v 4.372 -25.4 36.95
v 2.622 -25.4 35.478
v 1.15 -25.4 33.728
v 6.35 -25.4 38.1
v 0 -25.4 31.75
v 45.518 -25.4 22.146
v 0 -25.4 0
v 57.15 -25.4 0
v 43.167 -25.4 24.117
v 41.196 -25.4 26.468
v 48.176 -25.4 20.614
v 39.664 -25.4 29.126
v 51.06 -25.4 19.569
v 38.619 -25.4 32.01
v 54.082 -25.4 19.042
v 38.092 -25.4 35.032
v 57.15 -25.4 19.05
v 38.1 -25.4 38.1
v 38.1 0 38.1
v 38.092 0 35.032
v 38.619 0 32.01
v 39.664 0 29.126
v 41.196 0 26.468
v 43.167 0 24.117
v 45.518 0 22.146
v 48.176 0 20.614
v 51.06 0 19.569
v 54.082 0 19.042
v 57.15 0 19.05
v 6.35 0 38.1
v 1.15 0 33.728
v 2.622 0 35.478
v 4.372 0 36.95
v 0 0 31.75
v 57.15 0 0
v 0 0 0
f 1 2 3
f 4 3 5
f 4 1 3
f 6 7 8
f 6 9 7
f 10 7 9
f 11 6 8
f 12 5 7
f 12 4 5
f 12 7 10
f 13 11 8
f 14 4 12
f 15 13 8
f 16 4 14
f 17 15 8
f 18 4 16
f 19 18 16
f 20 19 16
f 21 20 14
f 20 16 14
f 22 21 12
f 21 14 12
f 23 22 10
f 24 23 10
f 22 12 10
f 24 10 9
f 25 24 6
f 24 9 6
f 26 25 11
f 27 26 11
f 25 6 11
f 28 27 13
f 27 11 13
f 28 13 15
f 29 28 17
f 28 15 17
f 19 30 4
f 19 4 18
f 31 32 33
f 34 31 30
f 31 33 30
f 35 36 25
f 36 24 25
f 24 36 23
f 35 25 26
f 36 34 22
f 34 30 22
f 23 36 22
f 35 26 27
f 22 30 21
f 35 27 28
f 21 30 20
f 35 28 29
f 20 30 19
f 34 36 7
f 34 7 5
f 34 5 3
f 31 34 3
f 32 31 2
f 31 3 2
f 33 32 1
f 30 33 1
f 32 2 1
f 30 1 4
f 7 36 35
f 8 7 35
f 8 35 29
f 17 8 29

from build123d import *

# Parameters (mm, degrees)
F0_W     = 57.15
F0_H     = 38.1
F1_DEPTH = 25.4
F3_DEPTH = 25.4
F5_DEPTH = 25.4


with BuildPart() as f1:
    # F0 (on Front) → F1 (new body)
    with BuildSketch(Plane.XZ):
        with Locations((28.575, 19.05)):
            Rectangle(F0_W, F0_H)
    extrude(amount=F1_DEPTH)

    # F2 (on face) → F3 (cut)
    with BuildSketch(Plane.XZ.offset(25.4)):
        with BuildLine():
            Line((57.15, 38.1), (38.1, 38.1))
            ThreePointArc((38.1, 38.1), (43.167062, 24.117062), (57.15, 19.05))
            Line((57.15, 19.05), (57.15, 38.1))
        make_face()
    extrude(amount=-F3_DEPTH, mode=Mode.SUBTRACT)

    # F4 (on face) → F5 (cut)
    with BuildSketch(Plane.XZ.offset(25.4)):
        with BuildLine():
            ThreePointArc((0, 31.75), (2.621624, 35.478376), (6.35, 38.1))
            Line((6.35, 38.1), (0, 38.1))
            Line((0, 38.1), (0, 31.75))
        make_face()
    extrude(amount=-F5_DEPTH, mode=Mode.SUBTRACT)


solid = f1.part
